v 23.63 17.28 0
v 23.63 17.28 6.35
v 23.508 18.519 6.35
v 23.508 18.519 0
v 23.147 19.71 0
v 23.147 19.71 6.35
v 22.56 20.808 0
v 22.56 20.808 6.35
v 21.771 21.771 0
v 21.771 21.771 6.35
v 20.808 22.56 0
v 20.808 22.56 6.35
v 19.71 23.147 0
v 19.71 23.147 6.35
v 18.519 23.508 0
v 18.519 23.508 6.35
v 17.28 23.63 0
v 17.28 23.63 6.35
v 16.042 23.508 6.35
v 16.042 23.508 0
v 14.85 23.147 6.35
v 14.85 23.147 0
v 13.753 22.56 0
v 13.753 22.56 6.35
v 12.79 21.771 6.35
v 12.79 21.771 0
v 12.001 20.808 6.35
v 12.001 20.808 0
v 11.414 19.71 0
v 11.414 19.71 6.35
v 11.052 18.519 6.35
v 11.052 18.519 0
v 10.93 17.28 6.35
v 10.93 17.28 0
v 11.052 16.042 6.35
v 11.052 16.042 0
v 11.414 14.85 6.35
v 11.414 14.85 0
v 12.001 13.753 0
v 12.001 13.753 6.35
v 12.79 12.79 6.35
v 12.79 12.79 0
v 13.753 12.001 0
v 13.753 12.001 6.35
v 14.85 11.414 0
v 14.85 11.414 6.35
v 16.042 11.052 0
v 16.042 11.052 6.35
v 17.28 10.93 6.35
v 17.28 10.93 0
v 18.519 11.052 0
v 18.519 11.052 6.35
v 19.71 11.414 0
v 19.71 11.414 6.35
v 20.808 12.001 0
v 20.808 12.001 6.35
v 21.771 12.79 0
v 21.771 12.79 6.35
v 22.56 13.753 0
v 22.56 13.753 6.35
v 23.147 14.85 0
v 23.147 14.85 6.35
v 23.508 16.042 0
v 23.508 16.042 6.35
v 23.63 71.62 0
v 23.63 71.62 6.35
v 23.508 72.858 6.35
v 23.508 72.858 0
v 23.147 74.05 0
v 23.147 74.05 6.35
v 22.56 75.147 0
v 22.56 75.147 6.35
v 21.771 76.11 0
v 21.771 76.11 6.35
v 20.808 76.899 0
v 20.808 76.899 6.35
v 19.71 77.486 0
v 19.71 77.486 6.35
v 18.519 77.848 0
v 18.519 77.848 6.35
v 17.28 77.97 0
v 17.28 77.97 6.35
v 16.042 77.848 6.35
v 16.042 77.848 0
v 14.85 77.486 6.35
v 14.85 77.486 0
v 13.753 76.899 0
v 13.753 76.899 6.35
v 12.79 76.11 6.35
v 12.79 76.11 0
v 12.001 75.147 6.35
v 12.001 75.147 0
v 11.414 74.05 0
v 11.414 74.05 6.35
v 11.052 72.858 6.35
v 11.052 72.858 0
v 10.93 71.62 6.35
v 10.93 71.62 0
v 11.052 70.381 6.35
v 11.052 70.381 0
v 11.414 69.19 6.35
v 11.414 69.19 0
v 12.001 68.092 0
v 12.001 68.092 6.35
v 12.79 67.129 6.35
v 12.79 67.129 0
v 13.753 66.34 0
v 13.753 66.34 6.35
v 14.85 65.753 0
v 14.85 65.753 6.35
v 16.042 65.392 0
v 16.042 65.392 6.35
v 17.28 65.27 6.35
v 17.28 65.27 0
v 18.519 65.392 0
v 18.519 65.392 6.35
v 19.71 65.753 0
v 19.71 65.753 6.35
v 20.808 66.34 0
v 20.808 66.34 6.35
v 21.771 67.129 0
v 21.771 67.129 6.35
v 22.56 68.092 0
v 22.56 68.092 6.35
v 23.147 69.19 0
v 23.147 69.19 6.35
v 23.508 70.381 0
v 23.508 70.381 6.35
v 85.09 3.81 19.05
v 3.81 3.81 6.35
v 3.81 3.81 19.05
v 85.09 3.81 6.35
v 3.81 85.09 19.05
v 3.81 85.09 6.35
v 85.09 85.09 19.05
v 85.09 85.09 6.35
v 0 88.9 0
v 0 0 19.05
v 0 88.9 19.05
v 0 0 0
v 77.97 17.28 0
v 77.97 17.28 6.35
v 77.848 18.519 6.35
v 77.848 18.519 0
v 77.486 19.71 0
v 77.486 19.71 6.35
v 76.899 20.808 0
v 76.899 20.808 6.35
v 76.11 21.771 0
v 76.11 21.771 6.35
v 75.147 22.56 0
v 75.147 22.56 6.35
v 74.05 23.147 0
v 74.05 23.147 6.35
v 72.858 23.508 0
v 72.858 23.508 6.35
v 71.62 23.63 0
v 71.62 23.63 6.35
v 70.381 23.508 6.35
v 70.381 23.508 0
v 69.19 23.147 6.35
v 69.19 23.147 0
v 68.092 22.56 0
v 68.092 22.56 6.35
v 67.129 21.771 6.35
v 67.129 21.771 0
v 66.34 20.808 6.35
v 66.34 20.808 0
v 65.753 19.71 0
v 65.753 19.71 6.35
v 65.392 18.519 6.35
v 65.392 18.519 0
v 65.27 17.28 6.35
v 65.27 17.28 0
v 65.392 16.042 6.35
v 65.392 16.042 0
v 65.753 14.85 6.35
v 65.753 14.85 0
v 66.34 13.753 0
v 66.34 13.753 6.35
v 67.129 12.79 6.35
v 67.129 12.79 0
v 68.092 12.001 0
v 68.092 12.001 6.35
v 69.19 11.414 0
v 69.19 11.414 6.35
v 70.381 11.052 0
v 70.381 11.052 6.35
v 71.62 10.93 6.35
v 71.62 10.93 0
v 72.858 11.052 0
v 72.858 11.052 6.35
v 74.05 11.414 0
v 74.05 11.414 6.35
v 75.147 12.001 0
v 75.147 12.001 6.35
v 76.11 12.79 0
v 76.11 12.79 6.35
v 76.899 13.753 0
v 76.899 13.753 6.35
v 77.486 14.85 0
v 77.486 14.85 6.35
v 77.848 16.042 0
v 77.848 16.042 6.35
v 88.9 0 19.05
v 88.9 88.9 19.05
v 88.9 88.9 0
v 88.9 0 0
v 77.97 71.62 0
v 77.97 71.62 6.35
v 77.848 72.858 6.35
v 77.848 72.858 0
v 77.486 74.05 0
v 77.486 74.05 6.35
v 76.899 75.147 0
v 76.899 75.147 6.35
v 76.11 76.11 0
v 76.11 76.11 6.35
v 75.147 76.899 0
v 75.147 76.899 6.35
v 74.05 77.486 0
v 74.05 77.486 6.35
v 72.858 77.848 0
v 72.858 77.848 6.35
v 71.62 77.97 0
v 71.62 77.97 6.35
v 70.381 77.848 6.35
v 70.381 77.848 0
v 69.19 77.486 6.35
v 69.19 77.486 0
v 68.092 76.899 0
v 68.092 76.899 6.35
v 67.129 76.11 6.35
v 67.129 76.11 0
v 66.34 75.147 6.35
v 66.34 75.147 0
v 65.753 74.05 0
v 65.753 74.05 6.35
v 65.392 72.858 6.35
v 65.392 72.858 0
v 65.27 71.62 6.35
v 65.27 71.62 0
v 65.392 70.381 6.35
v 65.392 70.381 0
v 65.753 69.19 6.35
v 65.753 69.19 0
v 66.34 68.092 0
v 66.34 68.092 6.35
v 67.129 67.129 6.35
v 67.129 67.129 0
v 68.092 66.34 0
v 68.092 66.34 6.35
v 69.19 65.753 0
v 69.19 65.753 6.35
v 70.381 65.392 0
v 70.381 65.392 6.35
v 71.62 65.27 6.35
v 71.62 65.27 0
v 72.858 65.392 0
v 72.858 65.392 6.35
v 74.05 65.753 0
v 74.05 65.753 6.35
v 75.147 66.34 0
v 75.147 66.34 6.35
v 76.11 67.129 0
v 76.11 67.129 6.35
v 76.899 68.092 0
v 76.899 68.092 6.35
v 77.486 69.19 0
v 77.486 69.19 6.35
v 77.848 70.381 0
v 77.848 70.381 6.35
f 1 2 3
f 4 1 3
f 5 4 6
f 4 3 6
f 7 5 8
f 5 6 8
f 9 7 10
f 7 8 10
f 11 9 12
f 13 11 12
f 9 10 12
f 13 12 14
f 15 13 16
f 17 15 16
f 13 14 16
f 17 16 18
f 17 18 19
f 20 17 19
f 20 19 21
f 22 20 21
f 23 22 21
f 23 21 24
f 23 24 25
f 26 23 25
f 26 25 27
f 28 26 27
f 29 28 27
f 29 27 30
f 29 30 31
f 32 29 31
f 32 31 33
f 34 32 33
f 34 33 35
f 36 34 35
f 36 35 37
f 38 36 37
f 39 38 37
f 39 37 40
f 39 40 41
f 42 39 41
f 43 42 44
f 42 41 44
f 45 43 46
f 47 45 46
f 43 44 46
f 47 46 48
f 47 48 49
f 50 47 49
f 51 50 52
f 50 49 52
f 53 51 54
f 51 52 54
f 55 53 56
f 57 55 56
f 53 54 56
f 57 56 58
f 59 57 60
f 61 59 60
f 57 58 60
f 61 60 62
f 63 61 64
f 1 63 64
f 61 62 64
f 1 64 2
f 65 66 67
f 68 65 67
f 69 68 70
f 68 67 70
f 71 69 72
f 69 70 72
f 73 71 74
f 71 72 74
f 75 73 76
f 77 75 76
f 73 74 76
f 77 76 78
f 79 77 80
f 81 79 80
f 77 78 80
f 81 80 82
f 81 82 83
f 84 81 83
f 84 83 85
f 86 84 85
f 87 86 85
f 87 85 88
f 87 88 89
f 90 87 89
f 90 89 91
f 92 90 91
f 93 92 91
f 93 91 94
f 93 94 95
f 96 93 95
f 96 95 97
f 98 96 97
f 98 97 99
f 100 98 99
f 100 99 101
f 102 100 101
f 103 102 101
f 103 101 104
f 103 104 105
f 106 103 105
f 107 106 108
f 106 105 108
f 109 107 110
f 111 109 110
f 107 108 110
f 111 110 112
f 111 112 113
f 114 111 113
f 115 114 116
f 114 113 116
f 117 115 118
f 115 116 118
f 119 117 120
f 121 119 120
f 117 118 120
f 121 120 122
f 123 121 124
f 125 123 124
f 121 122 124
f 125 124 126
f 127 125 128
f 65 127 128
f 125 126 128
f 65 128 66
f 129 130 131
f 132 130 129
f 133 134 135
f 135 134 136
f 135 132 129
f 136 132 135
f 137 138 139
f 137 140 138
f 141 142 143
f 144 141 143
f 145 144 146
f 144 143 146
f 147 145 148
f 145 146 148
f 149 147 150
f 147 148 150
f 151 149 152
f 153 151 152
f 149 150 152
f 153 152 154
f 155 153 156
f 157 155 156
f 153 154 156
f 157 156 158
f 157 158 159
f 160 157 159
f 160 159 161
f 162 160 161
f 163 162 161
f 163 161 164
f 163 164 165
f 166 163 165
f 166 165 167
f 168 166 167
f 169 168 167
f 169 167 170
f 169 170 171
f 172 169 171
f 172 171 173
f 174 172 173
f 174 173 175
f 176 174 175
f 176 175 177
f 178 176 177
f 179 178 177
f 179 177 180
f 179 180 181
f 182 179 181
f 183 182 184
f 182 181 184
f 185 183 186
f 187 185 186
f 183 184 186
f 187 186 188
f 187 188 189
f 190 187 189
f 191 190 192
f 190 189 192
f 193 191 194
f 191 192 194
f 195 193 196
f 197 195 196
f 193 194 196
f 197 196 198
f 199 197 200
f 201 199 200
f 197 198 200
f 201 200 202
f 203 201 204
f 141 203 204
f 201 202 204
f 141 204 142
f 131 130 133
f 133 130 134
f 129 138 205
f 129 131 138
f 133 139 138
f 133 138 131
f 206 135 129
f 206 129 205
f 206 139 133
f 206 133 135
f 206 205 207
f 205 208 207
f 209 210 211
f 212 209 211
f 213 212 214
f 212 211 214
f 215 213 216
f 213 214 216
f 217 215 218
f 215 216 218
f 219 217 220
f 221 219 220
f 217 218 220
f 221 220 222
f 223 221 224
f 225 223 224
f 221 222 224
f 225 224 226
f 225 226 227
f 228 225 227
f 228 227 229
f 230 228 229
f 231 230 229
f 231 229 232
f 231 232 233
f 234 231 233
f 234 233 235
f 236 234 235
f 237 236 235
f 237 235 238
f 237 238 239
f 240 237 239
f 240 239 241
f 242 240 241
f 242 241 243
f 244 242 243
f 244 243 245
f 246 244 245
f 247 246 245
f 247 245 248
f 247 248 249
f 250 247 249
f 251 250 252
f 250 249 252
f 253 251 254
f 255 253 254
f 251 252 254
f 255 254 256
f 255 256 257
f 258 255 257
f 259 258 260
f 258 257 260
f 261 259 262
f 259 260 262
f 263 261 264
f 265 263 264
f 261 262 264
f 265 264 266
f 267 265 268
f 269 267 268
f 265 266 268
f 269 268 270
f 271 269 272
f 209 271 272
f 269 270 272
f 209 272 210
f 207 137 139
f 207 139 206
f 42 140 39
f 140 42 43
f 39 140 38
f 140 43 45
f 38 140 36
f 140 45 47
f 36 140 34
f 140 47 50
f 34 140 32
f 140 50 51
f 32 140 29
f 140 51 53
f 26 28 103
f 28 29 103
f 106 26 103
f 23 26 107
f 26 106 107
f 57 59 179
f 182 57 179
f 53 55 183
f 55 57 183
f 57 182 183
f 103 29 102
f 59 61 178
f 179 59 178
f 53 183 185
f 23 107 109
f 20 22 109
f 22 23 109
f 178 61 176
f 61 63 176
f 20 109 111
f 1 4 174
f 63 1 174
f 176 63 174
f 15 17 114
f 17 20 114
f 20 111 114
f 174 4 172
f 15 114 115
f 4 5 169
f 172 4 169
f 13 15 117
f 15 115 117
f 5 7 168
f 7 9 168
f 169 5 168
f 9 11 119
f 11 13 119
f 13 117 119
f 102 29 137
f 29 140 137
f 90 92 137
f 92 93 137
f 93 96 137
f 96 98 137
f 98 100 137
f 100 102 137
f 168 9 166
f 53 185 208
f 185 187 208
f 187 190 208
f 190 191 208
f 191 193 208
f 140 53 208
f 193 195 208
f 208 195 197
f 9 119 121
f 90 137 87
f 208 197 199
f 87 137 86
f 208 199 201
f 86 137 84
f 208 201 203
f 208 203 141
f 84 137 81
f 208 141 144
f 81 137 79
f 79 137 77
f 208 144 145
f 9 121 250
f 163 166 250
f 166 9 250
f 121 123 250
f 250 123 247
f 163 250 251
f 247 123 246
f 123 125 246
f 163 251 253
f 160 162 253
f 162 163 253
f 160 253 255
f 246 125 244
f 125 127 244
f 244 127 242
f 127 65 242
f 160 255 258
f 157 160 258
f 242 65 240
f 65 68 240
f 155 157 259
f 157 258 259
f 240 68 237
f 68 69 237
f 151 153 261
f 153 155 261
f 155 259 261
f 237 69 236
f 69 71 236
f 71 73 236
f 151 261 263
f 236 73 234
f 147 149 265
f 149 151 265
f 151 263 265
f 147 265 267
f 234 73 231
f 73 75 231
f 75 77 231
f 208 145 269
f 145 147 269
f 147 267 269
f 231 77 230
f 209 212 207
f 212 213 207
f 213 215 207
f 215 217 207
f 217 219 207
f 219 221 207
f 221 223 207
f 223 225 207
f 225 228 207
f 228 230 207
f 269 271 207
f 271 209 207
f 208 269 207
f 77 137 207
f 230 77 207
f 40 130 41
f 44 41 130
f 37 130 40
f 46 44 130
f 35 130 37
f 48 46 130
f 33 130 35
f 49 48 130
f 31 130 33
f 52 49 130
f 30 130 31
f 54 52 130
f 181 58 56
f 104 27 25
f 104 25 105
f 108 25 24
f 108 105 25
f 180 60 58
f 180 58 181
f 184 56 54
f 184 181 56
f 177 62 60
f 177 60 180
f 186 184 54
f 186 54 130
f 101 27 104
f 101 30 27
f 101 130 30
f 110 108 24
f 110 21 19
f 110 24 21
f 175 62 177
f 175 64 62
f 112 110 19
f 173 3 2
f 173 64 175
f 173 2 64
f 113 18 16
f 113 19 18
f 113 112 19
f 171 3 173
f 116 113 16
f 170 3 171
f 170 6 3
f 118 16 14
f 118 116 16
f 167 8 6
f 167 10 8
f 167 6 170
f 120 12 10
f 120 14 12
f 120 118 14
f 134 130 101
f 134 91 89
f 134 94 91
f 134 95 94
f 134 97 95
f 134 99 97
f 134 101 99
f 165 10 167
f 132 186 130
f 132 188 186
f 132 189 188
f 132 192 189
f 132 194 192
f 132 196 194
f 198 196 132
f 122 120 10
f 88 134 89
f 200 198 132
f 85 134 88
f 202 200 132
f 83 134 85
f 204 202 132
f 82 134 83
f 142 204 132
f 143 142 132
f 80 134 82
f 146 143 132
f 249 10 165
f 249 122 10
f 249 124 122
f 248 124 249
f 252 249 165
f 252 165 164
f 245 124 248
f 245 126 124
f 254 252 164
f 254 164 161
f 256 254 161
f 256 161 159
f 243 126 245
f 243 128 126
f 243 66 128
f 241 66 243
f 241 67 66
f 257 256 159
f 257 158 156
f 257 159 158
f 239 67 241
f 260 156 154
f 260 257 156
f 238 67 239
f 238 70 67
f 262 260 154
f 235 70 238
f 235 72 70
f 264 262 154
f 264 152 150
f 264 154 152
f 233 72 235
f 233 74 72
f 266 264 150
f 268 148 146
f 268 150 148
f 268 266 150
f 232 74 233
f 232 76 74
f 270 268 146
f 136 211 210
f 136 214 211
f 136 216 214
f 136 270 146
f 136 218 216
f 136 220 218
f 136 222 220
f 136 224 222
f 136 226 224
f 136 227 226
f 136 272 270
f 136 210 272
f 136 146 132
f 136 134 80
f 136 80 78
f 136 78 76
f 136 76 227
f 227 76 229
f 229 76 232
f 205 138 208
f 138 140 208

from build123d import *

# Parameters (mm, degrees)
F0_W     = 88.9
F0_H     = 88.9
F1_DEPTH = 6.35
F2_W     = 88.9
F2_H     = 88.9
F2_W_2   = 81.28
F2_H_2   = 81.28
F3_DEPTH = 12.7
F4_R     = 6.35
F5_DEPTH = 6.351


with BuildPart() as f1:
    # F0 (on Top) → F1 (new body)
    with BuildSketch(Plane.XY):
        with Locations((44.45, 44.45)):
            Rectangle(F0_W, F0_H)
    extrude(amount=F1_DEPTH)

    # F2 (on face) → F3 (join)
    with BuildSketch(Plane.XY.offset(6.35)):
        with Locations((44.45, 44.45)):
            Rectangle(F2_W, F2_H)
        with Locations((44.45, 44.45)):
            Rectangle(F2_W_2, F2_H_2, mode=Mode.SUBTRACT)
    extrude(amount=F3_DEPTH)

    # F4 (on face) → F5 (cut, through all)
    with BuildSketch(Plane.XY.offset(6.35)):
        with Locations((17.280384, 71.619616)):
            Circle(F4_R)
        with Locations((17.280384, 17.280384)):
            Circle(F4_R)
        with Locations((71.619616, 17.280384)):
            Circle(F4_R)
        with Locations((71.619616, 71.619616)):
            Circle(F4_R)
    extrude(amount=-F5_DEPTH, mode=Mode.SUBTRACT)


solid = f1.part
